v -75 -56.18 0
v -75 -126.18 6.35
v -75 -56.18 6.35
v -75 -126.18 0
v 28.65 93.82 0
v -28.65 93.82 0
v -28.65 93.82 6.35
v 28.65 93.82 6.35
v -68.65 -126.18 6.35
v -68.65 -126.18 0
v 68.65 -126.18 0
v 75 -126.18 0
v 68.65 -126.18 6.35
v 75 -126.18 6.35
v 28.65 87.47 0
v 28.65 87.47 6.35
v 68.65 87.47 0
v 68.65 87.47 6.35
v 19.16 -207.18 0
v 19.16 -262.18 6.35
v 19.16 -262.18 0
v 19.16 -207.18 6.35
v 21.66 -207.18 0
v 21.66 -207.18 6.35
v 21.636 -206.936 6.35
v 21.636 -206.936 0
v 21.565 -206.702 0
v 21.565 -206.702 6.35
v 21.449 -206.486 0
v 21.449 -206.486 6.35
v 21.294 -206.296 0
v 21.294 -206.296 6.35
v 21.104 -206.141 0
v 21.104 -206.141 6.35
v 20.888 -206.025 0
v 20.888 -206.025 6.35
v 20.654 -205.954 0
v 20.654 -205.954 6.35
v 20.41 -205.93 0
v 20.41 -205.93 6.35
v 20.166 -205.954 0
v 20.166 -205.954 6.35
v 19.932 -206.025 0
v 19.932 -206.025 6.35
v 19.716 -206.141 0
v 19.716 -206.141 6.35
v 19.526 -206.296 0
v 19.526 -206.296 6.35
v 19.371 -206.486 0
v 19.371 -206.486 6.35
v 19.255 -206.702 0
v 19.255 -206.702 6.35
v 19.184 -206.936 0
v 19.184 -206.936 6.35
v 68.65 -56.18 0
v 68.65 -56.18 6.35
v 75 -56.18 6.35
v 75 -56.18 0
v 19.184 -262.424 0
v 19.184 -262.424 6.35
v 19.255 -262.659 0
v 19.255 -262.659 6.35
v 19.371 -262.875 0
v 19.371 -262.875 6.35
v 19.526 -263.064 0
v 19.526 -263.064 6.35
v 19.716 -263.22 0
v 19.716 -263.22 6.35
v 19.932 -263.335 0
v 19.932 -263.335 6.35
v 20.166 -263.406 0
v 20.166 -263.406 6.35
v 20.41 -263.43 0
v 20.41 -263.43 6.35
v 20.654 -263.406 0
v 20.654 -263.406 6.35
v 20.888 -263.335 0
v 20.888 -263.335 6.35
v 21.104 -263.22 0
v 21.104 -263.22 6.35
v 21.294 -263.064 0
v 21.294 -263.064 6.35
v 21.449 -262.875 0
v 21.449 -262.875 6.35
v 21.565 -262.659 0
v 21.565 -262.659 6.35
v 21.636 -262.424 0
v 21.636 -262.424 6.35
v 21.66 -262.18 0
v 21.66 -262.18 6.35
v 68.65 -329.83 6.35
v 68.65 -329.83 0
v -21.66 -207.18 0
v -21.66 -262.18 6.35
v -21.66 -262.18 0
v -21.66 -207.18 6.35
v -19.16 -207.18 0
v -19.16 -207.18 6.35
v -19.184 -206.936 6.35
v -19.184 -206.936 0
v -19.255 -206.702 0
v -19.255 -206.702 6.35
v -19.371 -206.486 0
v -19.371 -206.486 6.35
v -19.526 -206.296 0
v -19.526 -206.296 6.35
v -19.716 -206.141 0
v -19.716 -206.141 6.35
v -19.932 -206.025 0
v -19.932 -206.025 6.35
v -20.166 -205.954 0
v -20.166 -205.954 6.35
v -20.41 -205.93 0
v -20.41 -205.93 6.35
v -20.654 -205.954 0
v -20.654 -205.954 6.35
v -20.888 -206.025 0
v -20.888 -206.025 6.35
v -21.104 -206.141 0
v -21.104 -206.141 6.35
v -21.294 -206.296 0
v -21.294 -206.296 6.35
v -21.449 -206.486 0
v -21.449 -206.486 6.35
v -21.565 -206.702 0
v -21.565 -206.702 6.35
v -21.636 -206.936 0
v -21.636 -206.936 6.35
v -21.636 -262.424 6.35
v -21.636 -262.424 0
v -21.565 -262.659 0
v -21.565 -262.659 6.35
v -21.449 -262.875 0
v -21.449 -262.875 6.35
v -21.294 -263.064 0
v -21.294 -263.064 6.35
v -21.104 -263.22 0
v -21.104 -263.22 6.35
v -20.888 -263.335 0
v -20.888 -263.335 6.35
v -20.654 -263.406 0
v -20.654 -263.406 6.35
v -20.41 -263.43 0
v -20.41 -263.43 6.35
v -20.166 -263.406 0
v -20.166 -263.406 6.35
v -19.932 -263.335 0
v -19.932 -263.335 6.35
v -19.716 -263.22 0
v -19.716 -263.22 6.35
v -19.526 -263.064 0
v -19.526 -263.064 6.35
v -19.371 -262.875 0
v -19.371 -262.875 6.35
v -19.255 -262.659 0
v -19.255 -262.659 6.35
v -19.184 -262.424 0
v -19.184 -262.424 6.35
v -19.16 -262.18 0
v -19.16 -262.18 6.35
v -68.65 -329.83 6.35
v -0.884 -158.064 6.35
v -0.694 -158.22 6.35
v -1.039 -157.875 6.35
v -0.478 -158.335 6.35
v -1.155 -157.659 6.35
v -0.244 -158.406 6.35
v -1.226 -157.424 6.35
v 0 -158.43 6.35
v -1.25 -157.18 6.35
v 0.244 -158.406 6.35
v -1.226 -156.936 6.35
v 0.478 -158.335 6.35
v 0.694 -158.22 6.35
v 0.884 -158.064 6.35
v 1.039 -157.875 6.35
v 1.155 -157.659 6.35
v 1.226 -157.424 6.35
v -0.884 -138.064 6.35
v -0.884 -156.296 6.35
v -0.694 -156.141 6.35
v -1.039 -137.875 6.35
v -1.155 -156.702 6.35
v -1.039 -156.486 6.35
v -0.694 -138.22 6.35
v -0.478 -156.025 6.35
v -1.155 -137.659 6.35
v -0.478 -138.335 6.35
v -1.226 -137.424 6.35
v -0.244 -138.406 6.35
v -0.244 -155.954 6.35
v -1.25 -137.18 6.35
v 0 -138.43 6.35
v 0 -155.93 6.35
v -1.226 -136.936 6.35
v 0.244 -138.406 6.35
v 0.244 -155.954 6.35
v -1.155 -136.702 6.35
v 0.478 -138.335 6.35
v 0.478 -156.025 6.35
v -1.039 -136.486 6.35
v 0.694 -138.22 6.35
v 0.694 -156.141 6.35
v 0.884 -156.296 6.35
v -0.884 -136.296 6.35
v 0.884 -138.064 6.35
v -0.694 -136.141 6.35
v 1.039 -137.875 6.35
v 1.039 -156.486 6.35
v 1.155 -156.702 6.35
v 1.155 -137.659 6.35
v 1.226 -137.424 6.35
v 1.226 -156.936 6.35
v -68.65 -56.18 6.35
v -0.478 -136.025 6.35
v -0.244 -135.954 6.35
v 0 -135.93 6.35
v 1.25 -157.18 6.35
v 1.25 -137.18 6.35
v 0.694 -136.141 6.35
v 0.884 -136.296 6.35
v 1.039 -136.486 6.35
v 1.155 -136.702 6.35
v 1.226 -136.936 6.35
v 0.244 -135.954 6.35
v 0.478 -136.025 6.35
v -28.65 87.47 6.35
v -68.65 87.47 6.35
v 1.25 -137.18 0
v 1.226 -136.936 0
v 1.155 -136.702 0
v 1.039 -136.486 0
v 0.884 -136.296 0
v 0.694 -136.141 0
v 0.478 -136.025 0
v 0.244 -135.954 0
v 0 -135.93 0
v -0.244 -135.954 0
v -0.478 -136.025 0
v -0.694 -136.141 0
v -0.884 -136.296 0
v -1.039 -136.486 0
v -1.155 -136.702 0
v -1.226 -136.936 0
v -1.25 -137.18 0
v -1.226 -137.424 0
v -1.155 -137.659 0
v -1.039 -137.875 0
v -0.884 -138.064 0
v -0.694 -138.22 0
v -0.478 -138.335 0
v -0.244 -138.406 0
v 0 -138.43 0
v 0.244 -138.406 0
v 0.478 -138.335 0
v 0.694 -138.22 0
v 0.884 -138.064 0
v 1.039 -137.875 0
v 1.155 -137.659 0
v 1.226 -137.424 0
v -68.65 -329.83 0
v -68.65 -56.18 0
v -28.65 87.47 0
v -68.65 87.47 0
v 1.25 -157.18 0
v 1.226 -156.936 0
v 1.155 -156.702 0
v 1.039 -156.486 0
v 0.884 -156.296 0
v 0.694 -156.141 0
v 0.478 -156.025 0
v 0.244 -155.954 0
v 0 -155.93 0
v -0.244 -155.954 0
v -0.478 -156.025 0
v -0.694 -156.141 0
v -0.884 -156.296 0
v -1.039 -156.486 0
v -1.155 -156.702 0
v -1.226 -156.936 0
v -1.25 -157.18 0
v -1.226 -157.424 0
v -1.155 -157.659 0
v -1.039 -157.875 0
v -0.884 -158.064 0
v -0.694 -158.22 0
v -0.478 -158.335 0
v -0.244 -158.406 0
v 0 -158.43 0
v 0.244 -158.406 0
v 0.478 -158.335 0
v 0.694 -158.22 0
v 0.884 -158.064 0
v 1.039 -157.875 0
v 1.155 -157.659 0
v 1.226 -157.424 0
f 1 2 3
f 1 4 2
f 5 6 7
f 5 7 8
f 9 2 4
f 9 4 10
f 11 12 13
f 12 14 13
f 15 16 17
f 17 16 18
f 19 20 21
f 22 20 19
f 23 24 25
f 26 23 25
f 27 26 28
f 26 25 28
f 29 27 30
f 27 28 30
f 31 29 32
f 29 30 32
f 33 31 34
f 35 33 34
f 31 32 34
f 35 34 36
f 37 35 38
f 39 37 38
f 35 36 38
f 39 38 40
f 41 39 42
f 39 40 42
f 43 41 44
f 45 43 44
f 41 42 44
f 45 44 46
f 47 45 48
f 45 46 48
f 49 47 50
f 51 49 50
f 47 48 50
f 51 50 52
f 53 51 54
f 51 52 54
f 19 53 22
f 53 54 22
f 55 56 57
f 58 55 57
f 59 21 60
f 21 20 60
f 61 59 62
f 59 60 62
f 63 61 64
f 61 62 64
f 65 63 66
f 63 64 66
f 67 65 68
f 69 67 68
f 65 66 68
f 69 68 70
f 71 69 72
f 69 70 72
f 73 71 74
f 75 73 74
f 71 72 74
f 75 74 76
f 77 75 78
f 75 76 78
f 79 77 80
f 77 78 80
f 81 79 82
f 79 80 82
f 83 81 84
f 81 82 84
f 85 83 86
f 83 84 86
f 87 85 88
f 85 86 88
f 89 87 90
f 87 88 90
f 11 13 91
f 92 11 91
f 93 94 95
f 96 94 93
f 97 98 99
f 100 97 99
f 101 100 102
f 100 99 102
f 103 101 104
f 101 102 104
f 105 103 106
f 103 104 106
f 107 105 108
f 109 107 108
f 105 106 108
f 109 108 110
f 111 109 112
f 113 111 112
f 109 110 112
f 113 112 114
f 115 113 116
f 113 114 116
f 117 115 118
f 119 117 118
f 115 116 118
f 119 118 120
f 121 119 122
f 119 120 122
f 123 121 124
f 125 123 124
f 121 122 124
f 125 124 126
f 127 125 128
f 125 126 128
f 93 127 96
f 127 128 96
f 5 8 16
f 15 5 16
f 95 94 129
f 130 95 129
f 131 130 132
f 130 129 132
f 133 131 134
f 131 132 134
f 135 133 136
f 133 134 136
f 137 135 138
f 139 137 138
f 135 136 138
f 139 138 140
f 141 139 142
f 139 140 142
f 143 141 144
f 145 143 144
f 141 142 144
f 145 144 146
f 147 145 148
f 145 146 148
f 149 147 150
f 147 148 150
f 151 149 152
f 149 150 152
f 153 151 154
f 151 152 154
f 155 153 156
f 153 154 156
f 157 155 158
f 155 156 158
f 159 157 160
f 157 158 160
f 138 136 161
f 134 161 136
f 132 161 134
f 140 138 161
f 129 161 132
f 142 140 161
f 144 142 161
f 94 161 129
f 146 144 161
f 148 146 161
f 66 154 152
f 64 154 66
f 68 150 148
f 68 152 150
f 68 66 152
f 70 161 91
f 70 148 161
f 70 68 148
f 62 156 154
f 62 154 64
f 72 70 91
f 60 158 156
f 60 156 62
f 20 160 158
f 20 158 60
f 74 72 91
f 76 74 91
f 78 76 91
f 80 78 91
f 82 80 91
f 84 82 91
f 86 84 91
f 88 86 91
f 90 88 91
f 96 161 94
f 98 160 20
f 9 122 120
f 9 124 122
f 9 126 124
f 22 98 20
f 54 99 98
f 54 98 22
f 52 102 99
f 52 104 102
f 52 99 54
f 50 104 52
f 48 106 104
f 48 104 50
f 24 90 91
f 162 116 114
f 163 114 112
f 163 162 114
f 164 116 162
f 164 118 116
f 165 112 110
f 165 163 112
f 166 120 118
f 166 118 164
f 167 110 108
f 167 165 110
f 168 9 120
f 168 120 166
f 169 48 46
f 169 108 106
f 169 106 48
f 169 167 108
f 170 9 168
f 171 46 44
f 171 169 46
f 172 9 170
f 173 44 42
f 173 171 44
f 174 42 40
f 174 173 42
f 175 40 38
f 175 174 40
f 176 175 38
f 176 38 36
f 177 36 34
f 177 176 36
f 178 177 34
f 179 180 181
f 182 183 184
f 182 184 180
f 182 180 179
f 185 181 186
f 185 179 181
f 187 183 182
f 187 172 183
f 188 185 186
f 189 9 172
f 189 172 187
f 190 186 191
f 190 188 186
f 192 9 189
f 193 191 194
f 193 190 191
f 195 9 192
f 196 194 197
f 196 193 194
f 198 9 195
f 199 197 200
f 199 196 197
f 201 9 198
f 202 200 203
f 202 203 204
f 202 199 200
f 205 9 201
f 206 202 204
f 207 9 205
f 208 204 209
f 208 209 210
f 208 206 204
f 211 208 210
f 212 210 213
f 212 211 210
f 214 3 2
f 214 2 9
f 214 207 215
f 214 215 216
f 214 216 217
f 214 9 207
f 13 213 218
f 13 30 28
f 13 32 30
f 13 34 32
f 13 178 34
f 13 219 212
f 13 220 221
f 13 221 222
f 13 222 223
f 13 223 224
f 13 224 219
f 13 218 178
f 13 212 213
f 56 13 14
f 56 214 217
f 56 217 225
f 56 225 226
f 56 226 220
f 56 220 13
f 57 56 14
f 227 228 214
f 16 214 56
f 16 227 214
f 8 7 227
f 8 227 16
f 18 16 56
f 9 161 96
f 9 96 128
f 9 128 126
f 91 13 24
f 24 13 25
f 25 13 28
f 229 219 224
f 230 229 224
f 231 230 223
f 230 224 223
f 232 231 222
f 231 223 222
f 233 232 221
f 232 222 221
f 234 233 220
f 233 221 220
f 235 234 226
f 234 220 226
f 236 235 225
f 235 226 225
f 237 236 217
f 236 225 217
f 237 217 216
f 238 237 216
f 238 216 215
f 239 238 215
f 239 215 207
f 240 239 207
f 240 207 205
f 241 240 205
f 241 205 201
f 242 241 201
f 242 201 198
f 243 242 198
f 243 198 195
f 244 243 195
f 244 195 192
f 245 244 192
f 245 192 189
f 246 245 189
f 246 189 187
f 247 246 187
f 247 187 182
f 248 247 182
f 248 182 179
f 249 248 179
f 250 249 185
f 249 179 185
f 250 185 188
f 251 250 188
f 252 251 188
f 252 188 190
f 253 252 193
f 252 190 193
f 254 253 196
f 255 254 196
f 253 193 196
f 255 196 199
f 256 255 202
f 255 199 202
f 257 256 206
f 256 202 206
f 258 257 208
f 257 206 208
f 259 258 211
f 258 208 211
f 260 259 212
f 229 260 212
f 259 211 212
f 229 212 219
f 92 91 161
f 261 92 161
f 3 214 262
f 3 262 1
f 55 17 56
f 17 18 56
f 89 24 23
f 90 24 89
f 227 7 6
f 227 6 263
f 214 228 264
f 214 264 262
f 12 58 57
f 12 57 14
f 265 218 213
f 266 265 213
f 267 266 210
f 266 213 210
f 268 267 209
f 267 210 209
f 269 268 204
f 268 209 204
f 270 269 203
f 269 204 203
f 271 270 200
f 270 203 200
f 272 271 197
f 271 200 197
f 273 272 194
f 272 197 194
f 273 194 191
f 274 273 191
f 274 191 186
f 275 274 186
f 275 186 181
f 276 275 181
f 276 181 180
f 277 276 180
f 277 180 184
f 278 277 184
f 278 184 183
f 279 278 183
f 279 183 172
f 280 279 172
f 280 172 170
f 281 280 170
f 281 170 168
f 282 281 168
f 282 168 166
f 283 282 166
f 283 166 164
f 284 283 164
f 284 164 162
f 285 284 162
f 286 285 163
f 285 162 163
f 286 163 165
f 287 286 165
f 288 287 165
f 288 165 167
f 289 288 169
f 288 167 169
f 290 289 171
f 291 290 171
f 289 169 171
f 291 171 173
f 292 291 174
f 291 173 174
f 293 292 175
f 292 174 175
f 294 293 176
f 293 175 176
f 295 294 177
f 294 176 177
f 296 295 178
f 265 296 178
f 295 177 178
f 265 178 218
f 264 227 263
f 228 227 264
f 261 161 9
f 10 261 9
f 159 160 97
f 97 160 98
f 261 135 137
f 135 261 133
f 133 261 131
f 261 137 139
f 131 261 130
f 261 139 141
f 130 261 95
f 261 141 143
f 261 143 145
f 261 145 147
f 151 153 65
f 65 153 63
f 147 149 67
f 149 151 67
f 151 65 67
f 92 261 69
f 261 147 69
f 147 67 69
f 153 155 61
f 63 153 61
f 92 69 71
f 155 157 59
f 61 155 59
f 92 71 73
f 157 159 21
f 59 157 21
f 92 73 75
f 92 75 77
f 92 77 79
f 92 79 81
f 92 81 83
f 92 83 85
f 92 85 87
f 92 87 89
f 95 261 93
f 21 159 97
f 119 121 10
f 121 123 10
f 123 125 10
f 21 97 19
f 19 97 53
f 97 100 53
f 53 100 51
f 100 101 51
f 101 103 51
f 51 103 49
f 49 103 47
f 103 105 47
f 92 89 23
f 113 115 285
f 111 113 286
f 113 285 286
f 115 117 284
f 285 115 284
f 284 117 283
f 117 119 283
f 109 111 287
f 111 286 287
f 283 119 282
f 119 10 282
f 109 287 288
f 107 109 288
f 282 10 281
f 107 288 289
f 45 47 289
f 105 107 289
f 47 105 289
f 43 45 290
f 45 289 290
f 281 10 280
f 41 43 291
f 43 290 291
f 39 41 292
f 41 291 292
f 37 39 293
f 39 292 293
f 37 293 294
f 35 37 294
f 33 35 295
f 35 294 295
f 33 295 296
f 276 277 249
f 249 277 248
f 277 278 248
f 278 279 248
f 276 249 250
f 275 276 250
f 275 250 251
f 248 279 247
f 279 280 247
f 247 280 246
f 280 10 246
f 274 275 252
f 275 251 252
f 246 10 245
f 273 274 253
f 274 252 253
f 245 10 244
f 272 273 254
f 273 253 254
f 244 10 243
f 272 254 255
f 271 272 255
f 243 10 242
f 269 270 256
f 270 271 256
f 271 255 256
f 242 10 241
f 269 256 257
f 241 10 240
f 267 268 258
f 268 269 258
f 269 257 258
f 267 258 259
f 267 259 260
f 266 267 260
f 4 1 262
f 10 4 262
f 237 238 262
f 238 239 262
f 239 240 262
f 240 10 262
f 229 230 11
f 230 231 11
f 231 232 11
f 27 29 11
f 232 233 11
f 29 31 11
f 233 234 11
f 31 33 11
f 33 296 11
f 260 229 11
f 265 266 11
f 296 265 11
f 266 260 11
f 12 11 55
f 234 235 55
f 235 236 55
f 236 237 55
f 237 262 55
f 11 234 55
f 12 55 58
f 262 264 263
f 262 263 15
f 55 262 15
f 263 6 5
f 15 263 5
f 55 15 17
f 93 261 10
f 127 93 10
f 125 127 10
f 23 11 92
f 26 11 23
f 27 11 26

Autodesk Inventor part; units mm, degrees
ref_plane "YZ Plane" through (0, 0, 0) normal (1, 0, 0) x (0, 1, 0)
ref_plane "XZ Plane" through (0, 0, 0) normal (0, 1, 0) x (-1, 0, 0)
ref_plane "XY Plane" through (0, 0, 0) normal (0, 0, 1) x (1, 0, 0)
sketch "Sketch1" plane through (0, 0, 0) normal (0, 0, 1) x (1, 0, 0)
  line L0 (-75, 93.8197) -> (75, 93.8197)
  line L1 (75, 93.8197) -> (75, -336.1803)
  line L2 (75, -336.1803) -> (-75, -336.1803)
  line L3 (-75, -336.1803) -> (-75, 93.8197)
  point P0 (0, 0)
  dimension "d0" = 150
  dimension "d1" = 430
extrude "Extrusion1" add sketch "Sketch1" along normal blind 6.35
sketch "Sketch2" plane through (0, 0, 6.35) normal (0, 0, 1) x (1, 0, 0)
  line L0 (75, 93.8197) -> (-75, 93.8197) projected
  line L1 (-75, 93.8197) -> (-68.65, 93.8197)
  line L2 (-68.65, 93.8197) -> (-68.65, -56.1803)
  line L3 (-68.65, -56.1803) -> (-75, -56.1803)
  line L4 (-75, -56.1803) -> (-75, 93.8197)
  line L5 (-75, 93.8197) -> (-75, -336.1803) projected
  line L6 (-75, -126.1803) -> (-68.65, -126.1803)
  line L7 (-68.65, -126.1803) -> (-68.65, -236.1803)
  line L8 (-68.65, -236.1803) -> (-75, -236.1803)
  line L9 (-75, -236.1803) -> (-75, -126.1803)
  line L10 (-75, 93.8197) -> (-75, -336.1803) projected
  line L11 (-75, -336.1803) -> (-68.65, -336.1803)
  line L12 (-68.65, -336.1803) -> (-68.65, -186.1803)
  line L13 (-68.65, -186.1803) -> (-75, -186.1803)
  line L14 (-75, -186.1803) -> (-75, -336.1803)
  line L15 (75, -336.1803) -> (75, 93.8197) projected
  line L16 (75, 93.8197) -> (68.65, 93.8197)
  line L17 (68.65, 93.8197) -> (68.65, -56.1803)
  line L18 (68.65, -56.1803) -> (75, -56.1803)
  line L19 (75, -56.1803) -> (75, 93.8197)
  line L20 (75, -126.1803) -> (68.65, -126.1803)
  line L21 (68.65, -126.1803) -> (68.65, -236.1803)
  line L22 (68.65, -236.1803) -> (75, -236.1803)
  line L23 (75, -236.1803) -> (75, -126.1803)
  line L24 (-75, -336.1803) -> (75, -336.1803) projected
  line L25 (75, -336.1803) -> (68.65, -336.1803)
  line L26 (68.65, -336.1803) -> (68.65, -186.1803)
  line L27 (68.65, -186.1803) -> (75, -186.1803)
  line L28 (75, -186.1803) -> (75, -336.1803)
  line L29 (-68.65, 93.8197) -> (-28.65, 93.8197)
  line L30 (-28.65, 93.8197) -> (-28.65, 87.4697)
  line L31 (-28.65, 87.4697) -> (-68.65, 87.4697)
  line L32 (-68.65, 87.4697) -> (-68.65, 93.8197)
  line L33 (68.65, 93.8197) -> (28.65, 93.8197)
  line L34 (28.65, 93.8197) -> (28.65, 87.4697)
  line L35 (28.65, 87.4697) -> (68.65, 87.4697)
  line L36 (68.65, 87.4697) -> (68.65, 93.8197)
  line L37 (-68.65, -336.1803) -> (68.9785, -336.1803)
  line L38 (68.9785, -336.1803) -> (68.9785, -329.8303)
  line L39 (-68.65, -329.8303) -> (-68.65, -336.1803)
  line L40 (68.65, -329.8303) -> (68.65, -336.1803)
  line L41 (-75, -336.1803) -> (75, -336.1803)
  line L42 (75, -336.1803) -> (75, -329.8303)
  line L43 (75, -329.8303) -> (-75, -329.8303)
  line L44 (-75, -329.8303) -> (-75, -336.1803)
  point P0 (0, 0)
  point P1 (-75, -186.1803)
  point P2 (75, -186.1803)
  point P3 (-75, -236.1803)
  point P4 (75, -236.1803)
  point P5 (75, -126.1803)
  point P6 (75, -56.1803)
  dimension "d4" = 150
  dimension "d5" = 110
  dimension "d6" = 150
  dimension "d7" = 70
  dimension "d8" = 6.35
  dimension "d9" = 6.35
  dimension "d12" = 6.35
  dimension "d13" = 6.35
  dimension "d14" = 40
  dimension "d15" = 40
  dimension "d32" = 150
  dimension "d33" = 150
  dimension "d34" = 110
  dimension "d35" = 70
  dimension "d36" = 6.35
extrude "Extrusion2" cut sketch "Sketch2" against normal through all contours L15 L18 L17 L0 | L17 L35 L34 L0 | L15 L27 L21 L20 | L30 L31 L2 L0 | L15 L22 L21 L27 | L2 L3 L4 L0 | L15 L43 L26 L22 | L15 L24 L38 L43 | L38 L24 L26 L43 | L26 L24 L12 L43 | L6 L7 L13 L5 | L43 L5 L8 L12 | L12 L11 L5 L43 | L13 L7 L8 L5
sketch "Sketch4" plane through (0, 0, 6.35) normal (0, 0, 1) x (1, 0, 0)
  circle A0 centre (0, -157.1803) radius 1.25
  line L0 (-68.65, -336.1803) -> (68.65, -336.1803) projected
  line L1 (28.65, 93.8197) -> (-28.65, 93.8197) projected
  circle A1 centre (0, -137.1803) radius 1.25
  line L2 (0, -207.1803) -> (20.41, -207.1803)
  circle A2 centre (20.41, -207.1803) radius 1.25
  line L3 (0, -207.1803) -> (-20.41, -207.1803)
  circle A3 centre (-20.41, -207.1803) radius 1.25
  line L4 (0, -137.1803) -> (-75, -137.1803)
  line L5 (-75, -56.1803) -> (-75, -126.1803) projected
  line L6 (-75, -137.1803) -> (-75, -126.1803)
  line L7 (0, -157.1803) -> (0, -137.1803)
  line L8 (0, -207.1803) -> (0, -157.1803)
  circle A4 centre (-20.41, -262.1803) radius 1.25
  circle A5 centre (20.41, -262.1803) radius 1.25
  line L9 (-21.66, -262.1803) -> (-21.66, -207.1803)
  line L10 (-19.16, -262.1803) -> (-19.16, -207.1803)
  line L11 (19.16, -262.1803) -> (19.16, -207.1803)
  line L12 (21.66, -207.1803) -> (21.66, -262.1803)
  line L13 (21.66, -262.1803) -> (19.16, -262.1803)
  line L14 (-75, -56.1803) -> (-75, -126.1803) projected
  point P0 (0, 0)
  point P1 (-28.65, -336.1803)
  point P2 (28.65, -336.1803)
  point P3 (-75, -236.1803)
  point P4 (-75, -306.1803)
  dimension "d18" = 2.5
  dimension "d22" = 251
  dimension "d23" = 20
  dimension "d25" = 20.41
  dimension "d26" = 75
  dimension "d27" = 50
  dimension "d28" = 55
  dimension "d30" = 55
  dimension "d31" = 55
extrude "Extrusion3" cut sketch "Sketch4" against normal through all
equation "\"d9\" = d8"
equation "\"d13\" = d8"
equation "\"d15\" = d14"
equation "\"d32\" = d4"
equation "\"d33\" = d6"
equation "\"d34\" = d5"
equation "\"d35\" = d7"
equation "\"d30\" = d28"
properties part number "2201_Housing Bottom_V1" material "Wood (Birch)"
